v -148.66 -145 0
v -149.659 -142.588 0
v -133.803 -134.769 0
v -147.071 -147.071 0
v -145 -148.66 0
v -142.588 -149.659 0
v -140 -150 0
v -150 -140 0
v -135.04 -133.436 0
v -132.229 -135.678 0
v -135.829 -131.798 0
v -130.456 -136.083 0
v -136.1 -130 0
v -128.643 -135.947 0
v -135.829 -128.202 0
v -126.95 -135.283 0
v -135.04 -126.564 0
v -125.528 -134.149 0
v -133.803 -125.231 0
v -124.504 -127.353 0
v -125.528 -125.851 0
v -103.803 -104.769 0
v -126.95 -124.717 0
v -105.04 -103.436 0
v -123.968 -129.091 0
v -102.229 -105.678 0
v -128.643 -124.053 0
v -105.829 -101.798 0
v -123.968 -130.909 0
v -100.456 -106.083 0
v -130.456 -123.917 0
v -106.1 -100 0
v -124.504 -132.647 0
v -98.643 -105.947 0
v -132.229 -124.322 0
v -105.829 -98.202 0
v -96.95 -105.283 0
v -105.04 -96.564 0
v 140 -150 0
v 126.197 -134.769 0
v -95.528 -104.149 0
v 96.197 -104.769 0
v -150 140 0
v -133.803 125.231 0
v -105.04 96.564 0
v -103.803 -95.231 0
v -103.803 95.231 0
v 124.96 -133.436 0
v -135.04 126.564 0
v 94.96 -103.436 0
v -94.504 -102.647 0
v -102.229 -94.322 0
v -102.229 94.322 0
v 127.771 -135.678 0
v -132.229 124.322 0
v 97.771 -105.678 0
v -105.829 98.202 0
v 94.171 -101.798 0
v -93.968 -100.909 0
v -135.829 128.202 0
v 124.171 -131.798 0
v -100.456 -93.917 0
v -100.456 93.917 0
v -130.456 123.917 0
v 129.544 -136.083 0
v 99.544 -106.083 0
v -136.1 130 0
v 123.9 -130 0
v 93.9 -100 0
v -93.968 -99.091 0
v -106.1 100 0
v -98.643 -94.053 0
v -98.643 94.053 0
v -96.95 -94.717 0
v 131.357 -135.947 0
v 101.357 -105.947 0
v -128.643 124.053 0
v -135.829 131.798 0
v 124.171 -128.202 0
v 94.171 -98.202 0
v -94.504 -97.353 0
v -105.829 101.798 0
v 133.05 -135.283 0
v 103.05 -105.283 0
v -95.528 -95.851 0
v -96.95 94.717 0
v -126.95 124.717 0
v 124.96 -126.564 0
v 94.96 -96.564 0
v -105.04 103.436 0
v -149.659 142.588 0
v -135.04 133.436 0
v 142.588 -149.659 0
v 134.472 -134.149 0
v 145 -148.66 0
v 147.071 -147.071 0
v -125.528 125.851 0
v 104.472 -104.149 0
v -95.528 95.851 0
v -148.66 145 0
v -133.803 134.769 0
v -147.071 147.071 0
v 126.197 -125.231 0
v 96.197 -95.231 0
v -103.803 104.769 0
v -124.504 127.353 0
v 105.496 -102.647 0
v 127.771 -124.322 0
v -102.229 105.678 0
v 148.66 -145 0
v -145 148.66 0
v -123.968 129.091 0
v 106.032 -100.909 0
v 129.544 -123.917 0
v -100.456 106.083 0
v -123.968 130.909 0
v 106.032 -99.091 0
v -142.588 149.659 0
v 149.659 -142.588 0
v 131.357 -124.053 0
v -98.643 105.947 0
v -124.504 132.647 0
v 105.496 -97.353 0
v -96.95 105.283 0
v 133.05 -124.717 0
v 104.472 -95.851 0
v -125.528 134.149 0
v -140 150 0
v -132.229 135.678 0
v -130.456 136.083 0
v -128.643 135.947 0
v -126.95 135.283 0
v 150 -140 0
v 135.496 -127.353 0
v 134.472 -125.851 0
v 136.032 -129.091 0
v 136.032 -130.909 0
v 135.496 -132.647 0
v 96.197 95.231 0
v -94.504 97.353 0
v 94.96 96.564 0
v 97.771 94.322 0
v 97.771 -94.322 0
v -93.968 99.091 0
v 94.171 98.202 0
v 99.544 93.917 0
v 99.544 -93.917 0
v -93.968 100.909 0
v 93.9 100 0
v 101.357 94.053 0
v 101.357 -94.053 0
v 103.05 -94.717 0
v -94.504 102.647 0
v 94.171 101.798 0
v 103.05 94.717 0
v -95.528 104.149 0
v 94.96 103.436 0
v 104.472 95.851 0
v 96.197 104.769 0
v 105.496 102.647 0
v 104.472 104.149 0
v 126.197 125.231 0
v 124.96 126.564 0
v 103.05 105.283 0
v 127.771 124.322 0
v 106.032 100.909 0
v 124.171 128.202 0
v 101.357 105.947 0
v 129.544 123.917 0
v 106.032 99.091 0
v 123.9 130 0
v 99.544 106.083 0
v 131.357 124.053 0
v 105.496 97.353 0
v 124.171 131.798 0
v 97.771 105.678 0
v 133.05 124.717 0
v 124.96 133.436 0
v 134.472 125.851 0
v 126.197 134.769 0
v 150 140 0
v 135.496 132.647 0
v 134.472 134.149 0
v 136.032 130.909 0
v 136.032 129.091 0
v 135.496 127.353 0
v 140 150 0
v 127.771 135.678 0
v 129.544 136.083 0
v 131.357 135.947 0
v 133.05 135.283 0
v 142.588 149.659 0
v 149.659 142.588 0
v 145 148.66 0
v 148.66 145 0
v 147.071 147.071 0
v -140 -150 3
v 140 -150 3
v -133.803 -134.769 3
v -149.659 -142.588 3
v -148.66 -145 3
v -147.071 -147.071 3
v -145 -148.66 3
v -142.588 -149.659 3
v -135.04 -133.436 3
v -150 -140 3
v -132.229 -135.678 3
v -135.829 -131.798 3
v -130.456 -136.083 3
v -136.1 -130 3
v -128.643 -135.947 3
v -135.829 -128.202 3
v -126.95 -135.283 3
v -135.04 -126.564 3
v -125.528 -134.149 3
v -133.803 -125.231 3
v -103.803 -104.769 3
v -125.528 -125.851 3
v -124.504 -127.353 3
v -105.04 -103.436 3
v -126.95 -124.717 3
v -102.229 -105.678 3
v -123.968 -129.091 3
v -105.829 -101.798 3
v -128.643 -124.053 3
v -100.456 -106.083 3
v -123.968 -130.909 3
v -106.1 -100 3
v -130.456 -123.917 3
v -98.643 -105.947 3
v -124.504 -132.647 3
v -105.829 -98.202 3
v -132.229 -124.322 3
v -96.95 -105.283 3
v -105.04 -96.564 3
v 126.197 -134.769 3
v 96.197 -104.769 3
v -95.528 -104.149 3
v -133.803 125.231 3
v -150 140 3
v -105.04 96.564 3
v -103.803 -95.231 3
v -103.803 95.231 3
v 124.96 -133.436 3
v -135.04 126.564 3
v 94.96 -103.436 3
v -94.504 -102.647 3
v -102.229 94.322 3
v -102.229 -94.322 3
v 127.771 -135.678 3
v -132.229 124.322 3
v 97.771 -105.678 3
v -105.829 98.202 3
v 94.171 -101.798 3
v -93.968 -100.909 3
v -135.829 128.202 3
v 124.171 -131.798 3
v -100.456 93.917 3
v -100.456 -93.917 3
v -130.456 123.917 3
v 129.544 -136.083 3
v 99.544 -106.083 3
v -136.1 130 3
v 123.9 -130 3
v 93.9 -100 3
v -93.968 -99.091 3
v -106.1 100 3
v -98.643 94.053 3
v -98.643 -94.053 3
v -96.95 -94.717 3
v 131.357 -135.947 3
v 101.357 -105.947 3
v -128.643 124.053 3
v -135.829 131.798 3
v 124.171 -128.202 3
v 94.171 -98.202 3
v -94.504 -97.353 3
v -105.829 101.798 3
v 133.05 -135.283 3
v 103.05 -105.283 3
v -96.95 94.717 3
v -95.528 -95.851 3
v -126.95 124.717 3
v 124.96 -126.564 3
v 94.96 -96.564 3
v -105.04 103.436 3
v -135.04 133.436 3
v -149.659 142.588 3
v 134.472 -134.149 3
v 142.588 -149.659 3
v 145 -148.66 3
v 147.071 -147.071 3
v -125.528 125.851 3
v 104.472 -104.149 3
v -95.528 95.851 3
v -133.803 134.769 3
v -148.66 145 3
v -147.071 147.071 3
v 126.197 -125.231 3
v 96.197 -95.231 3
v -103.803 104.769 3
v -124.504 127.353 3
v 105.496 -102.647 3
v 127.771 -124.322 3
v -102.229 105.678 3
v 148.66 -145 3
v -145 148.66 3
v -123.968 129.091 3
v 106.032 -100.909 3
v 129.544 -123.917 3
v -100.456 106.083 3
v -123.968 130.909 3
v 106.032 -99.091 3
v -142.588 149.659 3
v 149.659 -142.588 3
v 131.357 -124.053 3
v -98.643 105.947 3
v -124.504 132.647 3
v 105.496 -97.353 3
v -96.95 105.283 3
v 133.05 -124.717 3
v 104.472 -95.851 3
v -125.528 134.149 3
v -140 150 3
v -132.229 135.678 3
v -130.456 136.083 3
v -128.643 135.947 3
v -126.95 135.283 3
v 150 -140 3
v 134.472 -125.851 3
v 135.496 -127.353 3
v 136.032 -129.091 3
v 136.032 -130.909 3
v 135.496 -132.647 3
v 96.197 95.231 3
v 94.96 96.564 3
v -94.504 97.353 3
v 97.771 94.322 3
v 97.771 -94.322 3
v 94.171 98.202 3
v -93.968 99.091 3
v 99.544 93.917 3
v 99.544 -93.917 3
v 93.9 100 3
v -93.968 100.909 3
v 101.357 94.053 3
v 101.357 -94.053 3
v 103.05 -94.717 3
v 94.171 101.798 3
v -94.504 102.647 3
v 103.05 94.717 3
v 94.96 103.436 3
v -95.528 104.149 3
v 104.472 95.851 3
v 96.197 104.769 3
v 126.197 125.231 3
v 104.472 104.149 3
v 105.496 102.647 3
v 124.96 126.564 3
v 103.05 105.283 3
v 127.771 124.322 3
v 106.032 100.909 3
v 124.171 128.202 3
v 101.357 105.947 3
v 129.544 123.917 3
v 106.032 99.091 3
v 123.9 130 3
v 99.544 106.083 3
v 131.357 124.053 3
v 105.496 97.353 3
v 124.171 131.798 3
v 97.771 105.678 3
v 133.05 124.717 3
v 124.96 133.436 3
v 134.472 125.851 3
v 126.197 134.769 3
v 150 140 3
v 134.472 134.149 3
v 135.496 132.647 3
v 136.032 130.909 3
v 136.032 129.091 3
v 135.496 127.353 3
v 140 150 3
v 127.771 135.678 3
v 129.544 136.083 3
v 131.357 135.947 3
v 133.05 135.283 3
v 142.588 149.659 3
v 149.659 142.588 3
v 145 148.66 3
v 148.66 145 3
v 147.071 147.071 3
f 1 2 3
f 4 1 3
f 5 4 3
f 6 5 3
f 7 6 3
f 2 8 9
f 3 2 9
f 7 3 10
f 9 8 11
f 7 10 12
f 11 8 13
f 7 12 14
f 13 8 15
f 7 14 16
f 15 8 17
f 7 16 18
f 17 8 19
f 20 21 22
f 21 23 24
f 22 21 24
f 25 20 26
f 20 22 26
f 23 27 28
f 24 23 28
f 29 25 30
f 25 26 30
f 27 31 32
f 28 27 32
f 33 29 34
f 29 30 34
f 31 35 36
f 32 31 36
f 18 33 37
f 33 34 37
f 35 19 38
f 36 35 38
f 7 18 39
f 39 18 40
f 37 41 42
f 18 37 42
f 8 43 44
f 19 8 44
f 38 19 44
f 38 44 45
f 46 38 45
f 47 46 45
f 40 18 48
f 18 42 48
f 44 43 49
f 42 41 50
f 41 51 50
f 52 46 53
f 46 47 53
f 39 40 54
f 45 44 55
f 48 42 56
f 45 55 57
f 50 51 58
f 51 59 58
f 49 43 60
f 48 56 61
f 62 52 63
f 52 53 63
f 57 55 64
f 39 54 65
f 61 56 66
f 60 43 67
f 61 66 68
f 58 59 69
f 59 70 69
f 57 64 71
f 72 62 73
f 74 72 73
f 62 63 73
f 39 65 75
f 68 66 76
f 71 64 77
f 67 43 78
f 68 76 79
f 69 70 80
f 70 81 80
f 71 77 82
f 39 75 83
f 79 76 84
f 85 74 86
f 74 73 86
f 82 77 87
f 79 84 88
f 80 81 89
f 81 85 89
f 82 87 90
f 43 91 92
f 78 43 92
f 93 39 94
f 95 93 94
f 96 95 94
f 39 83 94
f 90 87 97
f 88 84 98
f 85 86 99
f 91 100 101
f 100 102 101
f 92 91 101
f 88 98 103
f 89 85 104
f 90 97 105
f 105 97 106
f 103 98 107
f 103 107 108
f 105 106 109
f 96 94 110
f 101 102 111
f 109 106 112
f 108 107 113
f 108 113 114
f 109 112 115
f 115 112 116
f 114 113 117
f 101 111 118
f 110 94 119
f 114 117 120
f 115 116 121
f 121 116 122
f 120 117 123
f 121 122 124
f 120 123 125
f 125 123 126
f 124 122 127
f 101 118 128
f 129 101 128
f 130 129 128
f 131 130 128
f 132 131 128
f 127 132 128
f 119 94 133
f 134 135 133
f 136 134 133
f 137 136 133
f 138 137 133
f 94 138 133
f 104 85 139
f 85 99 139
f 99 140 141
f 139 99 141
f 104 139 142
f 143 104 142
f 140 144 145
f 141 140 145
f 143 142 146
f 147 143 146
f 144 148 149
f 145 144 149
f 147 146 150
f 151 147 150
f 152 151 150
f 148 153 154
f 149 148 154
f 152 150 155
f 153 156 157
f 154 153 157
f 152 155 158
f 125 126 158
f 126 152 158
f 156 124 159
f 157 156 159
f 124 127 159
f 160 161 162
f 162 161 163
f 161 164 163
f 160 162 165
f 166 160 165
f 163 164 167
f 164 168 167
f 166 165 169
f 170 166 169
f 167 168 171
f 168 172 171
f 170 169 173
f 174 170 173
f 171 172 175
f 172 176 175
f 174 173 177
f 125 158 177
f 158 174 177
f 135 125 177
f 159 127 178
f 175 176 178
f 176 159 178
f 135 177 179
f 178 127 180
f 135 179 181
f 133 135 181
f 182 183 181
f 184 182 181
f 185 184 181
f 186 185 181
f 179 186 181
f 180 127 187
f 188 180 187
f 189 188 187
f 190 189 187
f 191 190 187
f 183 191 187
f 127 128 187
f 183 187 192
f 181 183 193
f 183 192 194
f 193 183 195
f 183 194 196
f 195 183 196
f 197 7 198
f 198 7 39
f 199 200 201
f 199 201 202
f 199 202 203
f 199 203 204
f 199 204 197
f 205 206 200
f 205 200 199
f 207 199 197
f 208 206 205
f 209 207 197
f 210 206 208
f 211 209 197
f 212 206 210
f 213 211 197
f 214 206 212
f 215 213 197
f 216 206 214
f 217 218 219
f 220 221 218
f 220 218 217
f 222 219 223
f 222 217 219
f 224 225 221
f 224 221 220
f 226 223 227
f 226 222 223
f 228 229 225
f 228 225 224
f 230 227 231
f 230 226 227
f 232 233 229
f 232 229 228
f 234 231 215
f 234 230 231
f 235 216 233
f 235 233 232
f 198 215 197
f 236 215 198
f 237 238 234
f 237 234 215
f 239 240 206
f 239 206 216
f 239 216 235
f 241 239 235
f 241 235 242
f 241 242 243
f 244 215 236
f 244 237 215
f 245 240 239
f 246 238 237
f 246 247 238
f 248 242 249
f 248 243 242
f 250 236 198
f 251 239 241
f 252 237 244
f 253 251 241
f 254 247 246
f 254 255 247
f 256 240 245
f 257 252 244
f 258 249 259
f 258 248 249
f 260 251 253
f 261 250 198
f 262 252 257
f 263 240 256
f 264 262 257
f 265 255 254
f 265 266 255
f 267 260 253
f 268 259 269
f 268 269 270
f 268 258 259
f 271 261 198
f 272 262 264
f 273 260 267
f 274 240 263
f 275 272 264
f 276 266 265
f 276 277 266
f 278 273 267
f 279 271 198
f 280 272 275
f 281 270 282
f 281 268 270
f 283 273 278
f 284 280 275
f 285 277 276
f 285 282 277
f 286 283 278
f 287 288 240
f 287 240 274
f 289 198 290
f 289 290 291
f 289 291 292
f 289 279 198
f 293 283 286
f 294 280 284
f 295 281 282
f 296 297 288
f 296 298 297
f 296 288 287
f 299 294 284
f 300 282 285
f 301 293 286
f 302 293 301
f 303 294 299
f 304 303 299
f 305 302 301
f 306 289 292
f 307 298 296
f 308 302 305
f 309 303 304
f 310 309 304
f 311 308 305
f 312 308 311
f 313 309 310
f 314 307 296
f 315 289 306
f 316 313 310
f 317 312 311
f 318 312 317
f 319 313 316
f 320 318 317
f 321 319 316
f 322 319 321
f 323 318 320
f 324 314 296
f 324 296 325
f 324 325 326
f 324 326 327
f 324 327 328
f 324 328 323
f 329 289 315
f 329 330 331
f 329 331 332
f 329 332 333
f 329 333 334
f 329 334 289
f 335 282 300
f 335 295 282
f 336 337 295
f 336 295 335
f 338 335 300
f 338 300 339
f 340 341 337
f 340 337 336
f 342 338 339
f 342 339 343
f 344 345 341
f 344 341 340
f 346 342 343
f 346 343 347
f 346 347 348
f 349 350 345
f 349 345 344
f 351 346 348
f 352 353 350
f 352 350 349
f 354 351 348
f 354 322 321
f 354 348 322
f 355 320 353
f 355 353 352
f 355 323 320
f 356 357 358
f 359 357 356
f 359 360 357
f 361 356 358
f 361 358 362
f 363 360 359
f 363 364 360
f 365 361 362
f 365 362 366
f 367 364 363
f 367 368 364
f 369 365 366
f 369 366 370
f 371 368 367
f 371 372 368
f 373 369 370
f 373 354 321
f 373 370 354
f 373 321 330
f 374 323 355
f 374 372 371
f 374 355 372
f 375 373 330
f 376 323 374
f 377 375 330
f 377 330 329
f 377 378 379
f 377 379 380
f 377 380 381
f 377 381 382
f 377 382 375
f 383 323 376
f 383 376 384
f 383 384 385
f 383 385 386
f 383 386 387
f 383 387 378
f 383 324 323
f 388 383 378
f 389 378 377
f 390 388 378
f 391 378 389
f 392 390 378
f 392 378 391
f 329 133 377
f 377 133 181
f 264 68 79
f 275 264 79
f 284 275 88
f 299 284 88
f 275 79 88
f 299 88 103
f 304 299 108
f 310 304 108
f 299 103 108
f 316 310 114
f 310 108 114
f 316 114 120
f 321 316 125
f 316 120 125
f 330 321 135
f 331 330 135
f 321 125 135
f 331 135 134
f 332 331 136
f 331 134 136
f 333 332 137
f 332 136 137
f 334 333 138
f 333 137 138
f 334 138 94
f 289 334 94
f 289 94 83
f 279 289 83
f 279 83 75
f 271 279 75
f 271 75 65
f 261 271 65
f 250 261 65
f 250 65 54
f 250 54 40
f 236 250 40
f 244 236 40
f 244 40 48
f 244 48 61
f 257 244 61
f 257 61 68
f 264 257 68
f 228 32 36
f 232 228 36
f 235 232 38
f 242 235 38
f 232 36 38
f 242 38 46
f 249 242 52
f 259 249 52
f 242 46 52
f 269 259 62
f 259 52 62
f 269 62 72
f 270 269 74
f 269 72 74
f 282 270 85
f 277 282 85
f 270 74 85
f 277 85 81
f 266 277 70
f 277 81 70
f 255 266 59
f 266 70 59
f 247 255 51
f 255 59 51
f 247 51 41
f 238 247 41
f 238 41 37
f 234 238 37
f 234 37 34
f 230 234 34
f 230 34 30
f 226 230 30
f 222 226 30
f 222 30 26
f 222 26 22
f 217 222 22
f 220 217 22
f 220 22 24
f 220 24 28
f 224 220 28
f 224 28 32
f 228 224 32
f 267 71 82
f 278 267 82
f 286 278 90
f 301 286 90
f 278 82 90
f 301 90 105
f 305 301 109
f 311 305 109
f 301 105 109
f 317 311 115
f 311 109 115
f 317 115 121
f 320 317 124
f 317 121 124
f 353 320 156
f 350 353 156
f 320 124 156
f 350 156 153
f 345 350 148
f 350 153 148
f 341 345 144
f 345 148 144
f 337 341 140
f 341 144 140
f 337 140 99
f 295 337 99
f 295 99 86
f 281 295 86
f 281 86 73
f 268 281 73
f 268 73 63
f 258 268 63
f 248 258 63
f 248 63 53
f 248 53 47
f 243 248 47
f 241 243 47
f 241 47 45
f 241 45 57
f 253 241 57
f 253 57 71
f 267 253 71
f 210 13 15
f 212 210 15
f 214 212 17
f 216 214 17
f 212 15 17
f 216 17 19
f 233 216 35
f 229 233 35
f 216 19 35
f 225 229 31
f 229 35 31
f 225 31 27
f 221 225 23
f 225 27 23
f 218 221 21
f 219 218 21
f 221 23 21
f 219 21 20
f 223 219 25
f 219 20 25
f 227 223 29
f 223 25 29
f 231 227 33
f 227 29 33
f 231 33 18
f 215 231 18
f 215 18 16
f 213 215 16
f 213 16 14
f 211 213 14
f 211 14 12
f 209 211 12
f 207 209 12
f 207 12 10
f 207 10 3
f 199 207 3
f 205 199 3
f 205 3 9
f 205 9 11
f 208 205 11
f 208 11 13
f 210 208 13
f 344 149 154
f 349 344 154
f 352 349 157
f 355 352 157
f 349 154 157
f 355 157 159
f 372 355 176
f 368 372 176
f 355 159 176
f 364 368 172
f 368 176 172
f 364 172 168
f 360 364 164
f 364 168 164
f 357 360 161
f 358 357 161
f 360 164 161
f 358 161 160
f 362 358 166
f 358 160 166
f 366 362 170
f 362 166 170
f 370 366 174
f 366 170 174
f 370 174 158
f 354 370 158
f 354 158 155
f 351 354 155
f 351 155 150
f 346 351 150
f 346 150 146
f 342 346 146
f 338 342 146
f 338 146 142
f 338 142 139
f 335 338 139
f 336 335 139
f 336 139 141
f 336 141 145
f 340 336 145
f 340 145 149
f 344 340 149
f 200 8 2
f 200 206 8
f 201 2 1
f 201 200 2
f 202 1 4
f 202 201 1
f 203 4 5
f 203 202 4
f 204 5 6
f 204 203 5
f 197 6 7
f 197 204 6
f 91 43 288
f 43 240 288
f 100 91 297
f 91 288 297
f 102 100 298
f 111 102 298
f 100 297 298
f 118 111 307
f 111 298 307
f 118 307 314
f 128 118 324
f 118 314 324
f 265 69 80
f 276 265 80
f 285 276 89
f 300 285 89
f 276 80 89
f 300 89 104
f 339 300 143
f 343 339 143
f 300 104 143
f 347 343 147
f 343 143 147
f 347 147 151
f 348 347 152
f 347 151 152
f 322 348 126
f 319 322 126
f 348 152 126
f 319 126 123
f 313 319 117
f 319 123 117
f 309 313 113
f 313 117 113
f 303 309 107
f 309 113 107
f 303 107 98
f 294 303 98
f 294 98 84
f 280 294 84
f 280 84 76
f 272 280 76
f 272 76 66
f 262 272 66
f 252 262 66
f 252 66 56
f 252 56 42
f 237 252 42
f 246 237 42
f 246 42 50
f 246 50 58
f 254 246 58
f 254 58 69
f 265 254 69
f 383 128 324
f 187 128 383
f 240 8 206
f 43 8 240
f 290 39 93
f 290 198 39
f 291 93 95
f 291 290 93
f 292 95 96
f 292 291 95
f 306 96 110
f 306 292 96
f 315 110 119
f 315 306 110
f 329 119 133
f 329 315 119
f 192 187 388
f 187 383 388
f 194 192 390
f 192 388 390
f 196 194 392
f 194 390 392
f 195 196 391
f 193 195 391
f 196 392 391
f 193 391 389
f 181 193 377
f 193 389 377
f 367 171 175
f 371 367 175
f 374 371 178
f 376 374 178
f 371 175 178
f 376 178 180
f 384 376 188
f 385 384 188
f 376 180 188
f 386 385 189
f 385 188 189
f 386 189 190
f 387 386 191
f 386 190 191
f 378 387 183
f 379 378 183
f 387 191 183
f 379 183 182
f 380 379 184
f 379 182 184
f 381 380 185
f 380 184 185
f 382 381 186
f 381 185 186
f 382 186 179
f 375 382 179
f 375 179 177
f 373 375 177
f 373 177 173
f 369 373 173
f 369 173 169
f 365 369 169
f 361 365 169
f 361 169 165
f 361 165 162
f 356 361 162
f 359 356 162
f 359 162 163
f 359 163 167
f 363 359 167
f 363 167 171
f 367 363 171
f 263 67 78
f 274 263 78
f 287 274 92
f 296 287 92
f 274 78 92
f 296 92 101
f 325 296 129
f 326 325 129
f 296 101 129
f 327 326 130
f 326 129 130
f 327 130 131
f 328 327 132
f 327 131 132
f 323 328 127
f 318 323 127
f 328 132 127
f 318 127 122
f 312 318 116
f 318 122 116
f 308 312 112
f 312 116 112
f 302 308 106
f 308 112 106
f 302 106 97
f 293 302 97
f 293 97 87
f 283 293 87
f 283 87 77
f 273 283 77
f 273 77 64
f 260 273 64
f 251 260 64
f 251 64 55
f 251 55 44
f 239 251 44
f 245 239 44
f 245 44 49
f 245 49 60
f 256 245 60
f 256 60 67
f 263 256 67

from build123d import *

# Parameters (mm, degrees)
SKETCH1_W                        = 300
SKETCH1_H                        = 300
BOSS_EXTRUDE1_DEPTH              = 3
F_12_2_12_2_DIAMETER_HOLE1_D     = 12.2
F_12_2_12_2_DIAMETER_HOLE1_DEPTH = 23
F_12_2_12_2_DIAMETER_HOLE1_TIP   = 3.665249776
FILLET1_R                        = 10


with BuildPart() as part:
    # Sketch1 → Boss-Extrude1 (new body)
    with BuildSketch(Plane.XY):
        Rectangle(SKETCH1_W, SKETCH1_H)
    extrude(amount=BOSS_EXTRUDE1_DEPTH)

    # Ø12.2 (12.2) Diameter Hole1
    with Locations(Plane.XY.offset(3)):
        with Locations((-130, -130), (-100, -100), (130, -130), (100, -100), (130, 130), (-100, 100), (-130, 130), (100, 100)):
            Hole(F_12_2_12_2_DIAMETER_HOLE1_D / 2, depth=F_12_2_12_2_DIAMETER_HOLE1_DEPTH)
            with Locations((0, 0, -(F_12_2_12_2_DIAMETER_HOLE1_DEPTH + F_12_2_12_2_DIAMETER_HOLE1_TIP / 2))):  # 118° drill point
                Cone(0, F_12_2_12_2_DIAMETER_HOLE1_D / 2, F_12_2_12_2_DIAMETER_HOLE1_TIP, mode=Mode.SUBTRACT)

    # Fillet1
    fillet1_edges = [part.edges().sort_by_distance(p)[0] for p in [
        (150, -150, 1.5),
        (-150, -150, 1.5),
        (-150, 150, 1.5),
        (150, 150, 1.5),
    ]]
    fillet(fillet1_edges, radius=FILLET1_R)


solid = part.part
